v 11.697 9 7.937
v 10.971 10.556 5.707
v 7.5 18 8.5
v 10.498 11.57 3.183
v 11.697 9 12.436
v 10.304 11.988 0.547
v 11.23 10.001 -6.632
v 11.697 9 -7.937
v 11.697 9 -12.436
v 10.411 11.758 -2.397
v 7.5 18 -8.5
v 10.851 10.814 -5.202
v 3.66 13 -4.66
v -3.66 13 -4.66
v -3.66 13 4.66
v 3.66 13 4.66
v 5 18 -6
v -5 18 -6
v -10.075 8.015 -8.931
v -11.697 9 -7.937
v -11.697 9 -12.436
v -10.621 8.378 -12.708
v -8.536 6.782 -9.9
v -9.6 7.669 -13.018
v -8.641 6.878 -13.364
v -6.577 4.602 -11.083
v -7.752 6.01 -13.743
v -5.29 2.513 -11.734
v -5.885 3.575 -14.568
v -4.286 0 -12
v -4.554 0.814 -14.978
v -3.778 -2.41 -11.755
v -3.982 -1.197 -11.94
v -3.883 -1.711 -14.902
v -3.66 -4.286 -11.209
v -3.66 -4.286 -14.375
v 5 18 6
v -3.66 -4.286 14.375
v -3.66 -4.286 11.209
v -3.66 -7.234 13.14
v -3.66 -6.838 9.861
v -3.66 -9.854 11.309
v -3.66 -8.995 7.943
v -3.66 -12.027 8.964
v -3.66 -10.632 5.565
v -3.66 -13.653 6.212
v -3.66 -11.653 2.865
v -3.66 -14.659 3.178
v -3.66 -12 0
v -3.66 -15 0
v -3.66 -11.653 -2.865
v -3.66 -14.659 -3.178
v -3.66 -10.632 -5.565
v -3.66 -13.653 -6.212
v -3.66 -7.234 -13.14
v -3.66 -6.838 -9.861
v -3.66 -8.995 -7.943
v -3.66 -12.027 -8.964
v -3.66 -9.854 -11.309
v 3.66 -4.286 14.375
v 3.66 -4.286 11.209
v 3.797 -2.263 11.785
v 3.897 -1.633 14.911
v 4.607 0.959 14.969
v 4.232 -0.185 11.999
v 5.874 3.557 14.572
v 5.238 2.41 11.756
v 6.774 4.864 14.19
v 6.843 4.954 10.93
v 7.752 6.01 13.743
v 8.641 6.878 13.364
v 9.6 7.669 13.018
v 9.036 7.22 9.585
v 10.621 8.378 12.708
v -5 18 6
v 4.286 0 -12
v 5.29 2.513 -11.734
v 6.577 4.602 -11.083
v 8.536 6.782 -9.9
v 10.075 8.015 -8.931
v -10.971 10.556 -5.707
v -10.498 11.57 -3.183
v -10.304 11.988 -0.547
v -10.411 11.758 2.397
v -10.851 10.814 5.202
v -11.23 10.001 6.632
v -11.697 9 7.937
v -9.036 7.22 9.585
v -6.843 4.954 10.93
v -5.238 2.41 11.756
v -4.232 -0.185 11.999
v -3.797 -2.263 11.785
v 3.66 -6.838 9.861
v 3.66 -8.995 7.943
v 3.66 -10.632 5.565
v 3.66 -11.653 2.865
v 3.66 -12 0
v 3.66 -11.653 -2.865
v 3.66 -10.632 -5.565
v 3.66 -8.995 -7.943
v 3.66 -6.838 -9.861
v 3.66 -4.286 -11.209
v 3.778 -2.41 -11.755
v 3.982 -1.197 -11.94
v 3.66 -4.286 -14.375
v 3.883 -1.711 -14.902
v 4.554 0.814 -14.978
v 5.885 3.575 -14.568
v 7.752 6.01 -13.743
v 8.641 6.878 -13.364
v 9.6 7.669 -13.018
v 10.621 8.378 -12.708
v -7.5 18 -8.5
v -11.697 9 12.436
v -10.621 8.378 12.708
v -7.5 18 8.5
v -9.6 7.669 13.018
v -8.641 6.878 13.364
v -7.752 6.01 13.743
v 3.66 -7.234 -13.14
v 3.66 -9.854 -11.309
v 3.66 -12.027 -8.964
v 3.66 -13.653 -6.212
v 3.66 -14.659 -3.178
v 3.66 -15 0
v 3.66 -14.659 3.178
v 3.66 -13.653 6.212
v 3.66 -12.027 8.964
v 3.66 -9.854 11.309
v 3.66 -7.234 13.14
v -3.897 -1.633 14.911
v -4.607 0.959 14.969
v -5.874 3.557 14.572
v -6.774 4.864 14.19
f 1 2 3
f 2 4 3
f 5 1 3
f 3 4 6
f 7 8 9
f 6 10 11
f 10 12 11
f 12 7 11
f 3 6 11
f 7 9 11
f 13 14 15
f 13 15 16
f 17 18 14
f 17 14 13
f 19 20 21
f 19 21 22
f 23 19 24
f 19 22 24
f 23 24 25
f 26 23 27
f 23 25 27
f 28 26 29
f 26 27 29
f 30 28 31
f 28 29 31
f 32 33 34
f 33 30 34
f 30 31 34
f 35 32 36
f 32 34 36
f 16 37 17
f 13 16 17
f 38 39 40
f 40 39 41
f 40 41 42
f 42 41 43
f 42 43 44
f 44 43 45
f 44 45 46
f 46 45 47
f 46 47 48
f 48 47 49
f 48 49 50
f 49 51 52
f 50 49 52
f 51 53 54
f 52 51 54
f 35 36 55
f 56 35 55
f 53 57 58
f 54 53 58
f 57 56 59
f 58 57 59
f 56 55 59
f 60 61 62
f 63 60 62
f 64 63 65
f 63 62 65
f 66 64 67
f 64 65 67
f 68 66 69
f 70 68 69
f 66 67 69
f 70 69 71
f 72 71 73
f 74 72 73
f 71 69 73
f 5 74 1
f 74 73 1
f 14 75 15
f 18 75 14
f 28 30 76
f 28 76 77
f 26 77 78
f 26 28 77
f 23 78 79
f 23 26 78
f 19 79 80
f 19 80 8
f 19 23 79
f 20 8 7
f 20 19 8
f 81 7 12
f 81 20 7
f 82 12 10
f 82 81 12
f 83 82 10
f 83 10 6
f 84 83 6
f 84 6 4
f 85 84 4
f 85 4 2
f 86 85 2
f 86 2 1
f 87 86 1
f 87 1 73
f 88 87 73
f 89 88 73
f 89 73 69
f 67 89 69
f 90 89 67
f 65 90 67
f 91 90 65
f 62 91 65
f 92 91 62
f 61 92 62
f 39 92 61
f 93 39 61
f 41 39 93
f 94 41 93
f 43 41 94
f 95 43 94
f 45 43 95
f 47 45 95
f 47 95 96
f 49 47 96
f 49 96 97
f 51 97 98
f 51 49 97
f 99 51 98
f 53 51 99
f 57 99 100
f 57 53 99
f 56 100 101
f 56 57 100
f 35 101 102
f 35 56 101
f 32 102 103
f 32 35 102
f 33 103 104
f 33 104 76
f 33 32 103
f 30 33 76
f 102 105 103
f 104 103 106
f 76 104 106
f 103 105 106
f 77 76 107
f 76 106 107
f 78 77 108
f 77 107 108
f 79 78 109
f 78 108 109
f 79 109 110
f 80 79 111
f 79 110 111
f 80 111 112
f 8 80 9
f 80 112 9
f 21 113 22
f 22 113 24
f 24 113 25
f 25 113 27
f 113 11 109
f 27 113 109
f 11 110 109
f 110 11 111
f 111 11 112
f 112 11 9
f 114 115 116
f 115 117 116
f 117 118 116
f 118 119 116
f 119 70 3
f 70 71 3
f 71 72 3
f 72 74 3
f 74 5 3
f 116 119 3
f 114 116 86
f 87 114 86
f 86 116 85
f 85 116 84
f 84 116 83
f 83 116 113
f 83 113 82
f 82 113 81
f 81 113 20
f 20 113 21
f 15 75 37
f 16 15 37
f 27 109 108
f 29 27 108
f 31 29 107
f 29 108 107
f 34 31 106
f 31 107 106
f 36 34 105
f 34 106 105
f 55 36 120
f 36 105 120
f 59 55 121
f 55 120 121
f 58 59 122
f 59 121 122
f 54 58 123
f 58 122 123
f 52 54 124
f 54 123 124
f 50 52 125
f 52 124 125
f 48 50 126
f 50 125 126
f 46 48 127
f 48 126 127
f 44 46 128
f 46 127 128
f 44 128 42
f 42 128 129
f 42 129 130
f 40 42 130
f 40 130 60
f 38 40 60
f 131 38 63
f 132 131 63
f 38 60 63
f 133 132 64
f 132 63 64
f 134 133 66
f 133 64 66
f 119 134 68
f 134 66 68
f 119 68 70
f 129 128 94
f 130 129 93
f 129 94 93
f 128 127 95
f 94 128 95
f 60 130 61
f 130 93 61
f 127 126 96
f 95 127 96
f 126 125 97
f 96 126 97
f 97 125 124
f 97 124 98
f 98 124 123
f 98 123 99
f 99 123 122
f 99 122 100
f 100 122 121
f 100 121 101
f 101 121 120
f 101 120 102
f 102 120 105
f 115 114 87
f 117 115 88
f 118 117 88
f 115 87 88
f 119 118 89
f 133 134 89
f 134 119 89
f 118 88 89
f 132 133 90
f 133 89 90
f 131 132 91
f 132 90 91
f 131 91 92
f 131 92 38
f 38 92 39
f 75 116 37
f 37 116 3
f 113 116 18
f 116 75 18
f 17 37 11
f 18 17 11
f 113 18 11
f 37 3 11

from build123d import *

# Parameters (mm, degrees)
SKETCH_2_R               = 12
EXTRUDE_1_DEPTH          = 25
SKETCH_3_W               = 10
SKETCH_3_H               = 12
CUT_EXTRUDE_1_DEPTH      = 5
CUT_EXTRUDE_1_DRAFT      = -15
CUT_EXTRUDE_2_DEPTH      = 35.263683398
CUT_EXTRUDE_2_DEPTH_BACK = 35.263683398
SKETCH_4_OUTSIDE_W       = 65.4
SKETCH_4_OUTSIDE_H       = 48.4


with BuildPart() as part:
    # 草图2 → 凸台-拉伸1 (new, symmetric)
    with BuildSketch(Plane(origin=(0, 0, 0), x_dir=(0, 0, -1), z_dir=(1, 0, 0))):
        with BuildLine():
            Line((-13.743313889, 6.010101774), (-8.5, 18))
            Line((-8.5, 18), (8.5, 18))
            Line((8.5, 18), (13.743313889, 6.010101774))
            ThreePointArc((13.743313889, 6.010101774), (0, -15), (-13.743313889, 6.010101774))
        make_face()
        Circle(SKETCH_2_R, mode=Mode.SUBTRACT)
    extrude(amount=EXTRUDE_1_DEPTH, both=True)


with BuildPart() as cut_extrude_1_tool:
    # 草图3 → 切除-拉伸1 (with draft: the straight prism first)
    with BuildSketch(Plane(origin=(0, 18, 0), x_dir=(1, 0, 0), z_dir=(0, 1, 0))):
        Rectangle(SKETCH_3_W, SKETCH_3_H)
    extrude(amount=-CUT_EXTRUDE_1_DEPTH)
    # 切除-拉伸1: the draft: its side faces are tilted about the plane it starts from
    cut_extrude_1_sides = [cut_extrude_1_tool.faces().sort_by_distance(p)[0] for p in [
        (-5, 15.5, 0),
        (0, 15.5, 6),
        (5, 15.5, 0),
        (0, 15.5, -6),
    ]]
    draft(cut_extrude_1_sides, Plane(origin=(0, 18, 0), x_dir=(1, 0, 0), z_dir=(0, 1, 0)), CUT_EXTRUDE_1_DRAFT)


with BuildPart() as part_1:
    add(part.part)

    # 切除-拉伸1: cut by cut_extrude_1_tool
    add(cut_extrude_1_tool.part, mode=Mode.SUBTRACT)

    # 草图4 outside → 切除-拉伸2 (cut, two sides: drawn at the far end of the back side and taken through both)
    with BuildSketch(Plane.XY.offset(-CUT_EXTRUDE_2_DEPTH_BACK)):
        with Locations((0, 1.5)):
            Rectangle(SKETCH_4_OUTSIDE_W, SKETCH_4_OUTSIDE_H)
        with BuildLine():
            Line((7.5, 18), (-7.5, 18))
            Line((-7.5, 18), (-11.696768923, 9))
            ThreePointArc((-11.696768923, 9), (-5.825685936, 3.477922356), (-3.660254038, -4.285701903))
            Line((-3.660254038, -4.285701903), (-3.660254038, -15))
            Line((-3.660254038, -15), (3.660254038, -15))
            Line((3.660254038, -15), (3.660254038, -4.285701903))
            ThreePointArc((3.660254038, -4.285701903), (5.825685936, 3.477922356), (11.696768923, 9))
            Line((11.696768923, 9), (7.5, 18))
        make_face(mode=Mode.SUBTRACT)
    extrude(amount=CUT_EXTRUDE_2_DEPTH + CUT_EXTRUDE_2_DEPTH_BACK, mode=Mode.SUBTRACT)


solid = part_1.part
